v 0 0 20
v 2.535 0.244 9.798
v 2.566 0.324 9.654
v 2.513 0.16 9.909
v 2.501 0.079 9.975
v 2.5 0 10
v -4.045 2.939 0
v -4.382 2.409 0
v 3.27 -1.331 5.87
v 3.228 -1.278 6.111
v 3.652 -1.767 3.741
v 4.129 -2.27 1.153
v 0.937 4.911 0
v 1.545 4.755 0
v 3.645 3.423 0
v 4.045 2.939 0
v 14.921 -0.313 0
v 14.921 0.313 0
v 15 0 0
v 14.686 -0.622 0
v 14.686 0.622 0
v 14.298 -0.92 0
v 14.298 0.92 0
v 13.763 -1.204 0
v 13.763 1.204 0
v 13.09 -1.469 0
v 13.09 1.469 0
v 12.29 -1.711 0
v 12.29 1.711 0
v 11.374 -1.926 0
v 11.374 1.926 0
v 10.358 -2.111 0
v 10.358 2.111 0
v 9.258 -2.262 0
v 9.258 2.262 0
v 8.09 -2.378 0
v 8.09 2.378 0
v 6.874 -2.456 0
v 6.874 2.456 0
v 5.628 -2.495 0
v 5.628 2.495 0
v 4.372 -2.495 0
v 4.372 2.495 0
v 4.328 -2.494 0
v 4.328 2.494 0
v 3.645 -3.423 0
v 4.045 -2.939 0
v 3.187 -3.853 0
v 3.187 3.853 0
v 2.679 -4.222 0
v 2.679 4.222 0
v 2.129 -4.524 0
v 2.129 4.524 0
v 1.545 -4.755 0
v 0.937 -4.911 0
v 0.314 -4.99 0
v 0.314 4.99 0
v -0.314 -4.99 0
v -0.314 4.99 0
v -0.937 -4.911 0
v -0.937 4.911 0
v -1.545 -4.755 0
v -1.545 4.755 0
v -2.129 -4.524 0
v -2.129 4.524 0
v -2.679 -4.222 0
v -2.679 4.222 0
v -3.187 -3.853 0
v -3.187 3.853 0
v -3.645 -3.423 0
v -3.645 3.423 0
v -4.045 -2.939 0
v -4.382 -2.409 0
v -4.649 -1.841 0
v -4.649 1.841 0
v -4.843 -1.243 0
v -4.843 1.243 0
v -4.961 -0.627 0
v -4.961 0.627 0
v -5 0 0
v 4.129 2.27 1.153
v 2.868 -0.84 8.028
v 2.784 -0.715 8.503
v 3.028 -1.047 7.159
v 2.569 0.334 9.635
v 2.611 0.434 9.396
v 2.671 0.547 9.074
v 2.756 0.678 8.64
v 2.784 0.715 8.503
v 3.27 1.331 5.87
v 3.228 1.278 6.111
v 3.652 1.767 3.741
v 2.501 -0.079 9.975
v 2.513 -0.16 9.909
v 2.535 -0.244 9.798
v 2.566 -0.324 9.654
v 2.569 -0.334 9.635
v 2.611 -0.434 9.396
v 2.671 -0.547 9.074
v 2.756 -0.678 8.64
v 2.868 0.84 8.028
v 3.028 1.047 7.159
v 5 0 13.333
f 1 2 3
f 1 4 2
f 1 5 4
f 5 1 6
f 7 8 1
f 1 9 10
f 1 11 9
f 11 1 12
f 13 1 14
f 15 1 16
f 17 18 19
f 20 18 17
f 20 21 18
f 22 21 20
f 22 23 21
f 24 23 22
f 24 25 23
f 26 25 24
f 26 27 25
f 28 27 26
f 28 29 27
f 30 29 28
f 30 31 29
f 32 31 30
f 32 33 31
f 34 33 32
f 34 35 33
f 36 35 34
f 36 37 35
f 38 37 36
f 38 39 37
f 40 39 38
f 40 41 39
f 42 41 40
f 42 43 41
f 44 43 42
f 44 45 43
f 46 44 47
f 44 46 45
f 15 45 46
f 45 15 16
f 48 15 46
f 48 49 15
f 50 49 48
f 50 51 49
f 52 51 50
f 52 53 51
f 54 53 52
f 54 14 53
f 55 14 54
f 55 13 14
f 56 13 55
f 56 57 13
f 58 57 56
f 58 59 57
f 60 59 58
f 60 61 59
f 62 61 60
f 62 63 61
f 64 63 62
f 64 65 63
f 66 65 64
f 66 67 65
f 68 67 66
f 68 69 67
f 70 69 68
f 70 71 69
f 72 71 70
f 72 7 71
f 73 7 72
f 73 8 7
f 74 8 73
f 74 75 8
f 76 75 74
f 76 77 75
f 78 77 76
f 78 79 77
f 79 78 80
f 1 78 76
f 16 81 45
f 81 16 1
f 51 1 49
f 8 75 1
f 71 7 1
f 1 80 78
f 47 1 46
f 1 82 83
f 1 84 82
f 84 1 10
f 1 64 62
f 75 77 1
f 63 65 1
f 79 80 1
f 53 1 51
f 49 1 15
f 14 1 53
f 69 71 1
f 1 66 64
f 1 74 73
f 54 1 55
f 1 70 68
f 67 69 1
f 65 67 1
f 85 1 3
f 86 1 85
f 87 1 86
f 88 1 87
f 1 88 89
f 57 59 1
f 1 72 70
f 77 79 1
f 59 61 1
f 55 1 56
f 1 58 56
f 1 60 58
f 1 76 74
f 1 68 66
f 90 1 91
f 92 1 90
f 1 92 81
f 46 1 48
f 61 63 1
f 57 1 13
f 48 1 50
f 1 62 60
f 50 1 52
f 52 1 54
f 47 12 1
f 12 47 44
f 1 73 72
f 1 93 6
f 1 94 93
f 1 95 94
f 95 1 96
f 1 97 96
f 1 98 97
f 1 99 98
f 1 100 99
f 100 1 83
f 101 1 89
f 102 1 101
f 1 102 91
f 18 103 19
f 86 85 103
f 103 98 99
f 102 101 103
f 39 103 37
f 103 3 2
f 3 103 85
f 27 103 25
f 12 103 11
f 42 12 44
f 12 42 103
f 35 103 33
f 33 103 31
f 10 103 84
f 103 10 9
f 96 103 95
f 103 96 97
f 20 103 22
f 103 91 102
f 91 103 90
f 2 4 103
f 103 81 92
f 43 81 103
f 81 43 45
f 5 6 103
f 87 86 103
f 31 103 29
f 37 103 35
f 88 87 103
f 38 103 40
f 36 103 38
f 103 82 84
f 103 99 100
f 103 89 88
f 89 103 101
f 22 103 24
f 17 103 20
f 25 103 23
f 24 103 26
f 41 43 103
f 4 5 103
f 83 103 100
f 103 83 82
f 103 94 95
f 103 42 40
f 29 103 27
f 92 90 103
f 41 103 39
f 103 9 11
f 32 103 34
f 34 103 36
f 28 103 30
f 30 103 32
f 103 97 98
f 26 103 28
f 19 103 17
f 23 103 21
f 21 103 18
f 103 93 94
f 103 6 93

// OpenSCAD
$fn=50;
cylinder(h=20, r1=5, r2=0);
translate([5, 0, 0]) scale([2, 1/2, 2/3]) cylinder(h=20, r1=5, r2=0);
